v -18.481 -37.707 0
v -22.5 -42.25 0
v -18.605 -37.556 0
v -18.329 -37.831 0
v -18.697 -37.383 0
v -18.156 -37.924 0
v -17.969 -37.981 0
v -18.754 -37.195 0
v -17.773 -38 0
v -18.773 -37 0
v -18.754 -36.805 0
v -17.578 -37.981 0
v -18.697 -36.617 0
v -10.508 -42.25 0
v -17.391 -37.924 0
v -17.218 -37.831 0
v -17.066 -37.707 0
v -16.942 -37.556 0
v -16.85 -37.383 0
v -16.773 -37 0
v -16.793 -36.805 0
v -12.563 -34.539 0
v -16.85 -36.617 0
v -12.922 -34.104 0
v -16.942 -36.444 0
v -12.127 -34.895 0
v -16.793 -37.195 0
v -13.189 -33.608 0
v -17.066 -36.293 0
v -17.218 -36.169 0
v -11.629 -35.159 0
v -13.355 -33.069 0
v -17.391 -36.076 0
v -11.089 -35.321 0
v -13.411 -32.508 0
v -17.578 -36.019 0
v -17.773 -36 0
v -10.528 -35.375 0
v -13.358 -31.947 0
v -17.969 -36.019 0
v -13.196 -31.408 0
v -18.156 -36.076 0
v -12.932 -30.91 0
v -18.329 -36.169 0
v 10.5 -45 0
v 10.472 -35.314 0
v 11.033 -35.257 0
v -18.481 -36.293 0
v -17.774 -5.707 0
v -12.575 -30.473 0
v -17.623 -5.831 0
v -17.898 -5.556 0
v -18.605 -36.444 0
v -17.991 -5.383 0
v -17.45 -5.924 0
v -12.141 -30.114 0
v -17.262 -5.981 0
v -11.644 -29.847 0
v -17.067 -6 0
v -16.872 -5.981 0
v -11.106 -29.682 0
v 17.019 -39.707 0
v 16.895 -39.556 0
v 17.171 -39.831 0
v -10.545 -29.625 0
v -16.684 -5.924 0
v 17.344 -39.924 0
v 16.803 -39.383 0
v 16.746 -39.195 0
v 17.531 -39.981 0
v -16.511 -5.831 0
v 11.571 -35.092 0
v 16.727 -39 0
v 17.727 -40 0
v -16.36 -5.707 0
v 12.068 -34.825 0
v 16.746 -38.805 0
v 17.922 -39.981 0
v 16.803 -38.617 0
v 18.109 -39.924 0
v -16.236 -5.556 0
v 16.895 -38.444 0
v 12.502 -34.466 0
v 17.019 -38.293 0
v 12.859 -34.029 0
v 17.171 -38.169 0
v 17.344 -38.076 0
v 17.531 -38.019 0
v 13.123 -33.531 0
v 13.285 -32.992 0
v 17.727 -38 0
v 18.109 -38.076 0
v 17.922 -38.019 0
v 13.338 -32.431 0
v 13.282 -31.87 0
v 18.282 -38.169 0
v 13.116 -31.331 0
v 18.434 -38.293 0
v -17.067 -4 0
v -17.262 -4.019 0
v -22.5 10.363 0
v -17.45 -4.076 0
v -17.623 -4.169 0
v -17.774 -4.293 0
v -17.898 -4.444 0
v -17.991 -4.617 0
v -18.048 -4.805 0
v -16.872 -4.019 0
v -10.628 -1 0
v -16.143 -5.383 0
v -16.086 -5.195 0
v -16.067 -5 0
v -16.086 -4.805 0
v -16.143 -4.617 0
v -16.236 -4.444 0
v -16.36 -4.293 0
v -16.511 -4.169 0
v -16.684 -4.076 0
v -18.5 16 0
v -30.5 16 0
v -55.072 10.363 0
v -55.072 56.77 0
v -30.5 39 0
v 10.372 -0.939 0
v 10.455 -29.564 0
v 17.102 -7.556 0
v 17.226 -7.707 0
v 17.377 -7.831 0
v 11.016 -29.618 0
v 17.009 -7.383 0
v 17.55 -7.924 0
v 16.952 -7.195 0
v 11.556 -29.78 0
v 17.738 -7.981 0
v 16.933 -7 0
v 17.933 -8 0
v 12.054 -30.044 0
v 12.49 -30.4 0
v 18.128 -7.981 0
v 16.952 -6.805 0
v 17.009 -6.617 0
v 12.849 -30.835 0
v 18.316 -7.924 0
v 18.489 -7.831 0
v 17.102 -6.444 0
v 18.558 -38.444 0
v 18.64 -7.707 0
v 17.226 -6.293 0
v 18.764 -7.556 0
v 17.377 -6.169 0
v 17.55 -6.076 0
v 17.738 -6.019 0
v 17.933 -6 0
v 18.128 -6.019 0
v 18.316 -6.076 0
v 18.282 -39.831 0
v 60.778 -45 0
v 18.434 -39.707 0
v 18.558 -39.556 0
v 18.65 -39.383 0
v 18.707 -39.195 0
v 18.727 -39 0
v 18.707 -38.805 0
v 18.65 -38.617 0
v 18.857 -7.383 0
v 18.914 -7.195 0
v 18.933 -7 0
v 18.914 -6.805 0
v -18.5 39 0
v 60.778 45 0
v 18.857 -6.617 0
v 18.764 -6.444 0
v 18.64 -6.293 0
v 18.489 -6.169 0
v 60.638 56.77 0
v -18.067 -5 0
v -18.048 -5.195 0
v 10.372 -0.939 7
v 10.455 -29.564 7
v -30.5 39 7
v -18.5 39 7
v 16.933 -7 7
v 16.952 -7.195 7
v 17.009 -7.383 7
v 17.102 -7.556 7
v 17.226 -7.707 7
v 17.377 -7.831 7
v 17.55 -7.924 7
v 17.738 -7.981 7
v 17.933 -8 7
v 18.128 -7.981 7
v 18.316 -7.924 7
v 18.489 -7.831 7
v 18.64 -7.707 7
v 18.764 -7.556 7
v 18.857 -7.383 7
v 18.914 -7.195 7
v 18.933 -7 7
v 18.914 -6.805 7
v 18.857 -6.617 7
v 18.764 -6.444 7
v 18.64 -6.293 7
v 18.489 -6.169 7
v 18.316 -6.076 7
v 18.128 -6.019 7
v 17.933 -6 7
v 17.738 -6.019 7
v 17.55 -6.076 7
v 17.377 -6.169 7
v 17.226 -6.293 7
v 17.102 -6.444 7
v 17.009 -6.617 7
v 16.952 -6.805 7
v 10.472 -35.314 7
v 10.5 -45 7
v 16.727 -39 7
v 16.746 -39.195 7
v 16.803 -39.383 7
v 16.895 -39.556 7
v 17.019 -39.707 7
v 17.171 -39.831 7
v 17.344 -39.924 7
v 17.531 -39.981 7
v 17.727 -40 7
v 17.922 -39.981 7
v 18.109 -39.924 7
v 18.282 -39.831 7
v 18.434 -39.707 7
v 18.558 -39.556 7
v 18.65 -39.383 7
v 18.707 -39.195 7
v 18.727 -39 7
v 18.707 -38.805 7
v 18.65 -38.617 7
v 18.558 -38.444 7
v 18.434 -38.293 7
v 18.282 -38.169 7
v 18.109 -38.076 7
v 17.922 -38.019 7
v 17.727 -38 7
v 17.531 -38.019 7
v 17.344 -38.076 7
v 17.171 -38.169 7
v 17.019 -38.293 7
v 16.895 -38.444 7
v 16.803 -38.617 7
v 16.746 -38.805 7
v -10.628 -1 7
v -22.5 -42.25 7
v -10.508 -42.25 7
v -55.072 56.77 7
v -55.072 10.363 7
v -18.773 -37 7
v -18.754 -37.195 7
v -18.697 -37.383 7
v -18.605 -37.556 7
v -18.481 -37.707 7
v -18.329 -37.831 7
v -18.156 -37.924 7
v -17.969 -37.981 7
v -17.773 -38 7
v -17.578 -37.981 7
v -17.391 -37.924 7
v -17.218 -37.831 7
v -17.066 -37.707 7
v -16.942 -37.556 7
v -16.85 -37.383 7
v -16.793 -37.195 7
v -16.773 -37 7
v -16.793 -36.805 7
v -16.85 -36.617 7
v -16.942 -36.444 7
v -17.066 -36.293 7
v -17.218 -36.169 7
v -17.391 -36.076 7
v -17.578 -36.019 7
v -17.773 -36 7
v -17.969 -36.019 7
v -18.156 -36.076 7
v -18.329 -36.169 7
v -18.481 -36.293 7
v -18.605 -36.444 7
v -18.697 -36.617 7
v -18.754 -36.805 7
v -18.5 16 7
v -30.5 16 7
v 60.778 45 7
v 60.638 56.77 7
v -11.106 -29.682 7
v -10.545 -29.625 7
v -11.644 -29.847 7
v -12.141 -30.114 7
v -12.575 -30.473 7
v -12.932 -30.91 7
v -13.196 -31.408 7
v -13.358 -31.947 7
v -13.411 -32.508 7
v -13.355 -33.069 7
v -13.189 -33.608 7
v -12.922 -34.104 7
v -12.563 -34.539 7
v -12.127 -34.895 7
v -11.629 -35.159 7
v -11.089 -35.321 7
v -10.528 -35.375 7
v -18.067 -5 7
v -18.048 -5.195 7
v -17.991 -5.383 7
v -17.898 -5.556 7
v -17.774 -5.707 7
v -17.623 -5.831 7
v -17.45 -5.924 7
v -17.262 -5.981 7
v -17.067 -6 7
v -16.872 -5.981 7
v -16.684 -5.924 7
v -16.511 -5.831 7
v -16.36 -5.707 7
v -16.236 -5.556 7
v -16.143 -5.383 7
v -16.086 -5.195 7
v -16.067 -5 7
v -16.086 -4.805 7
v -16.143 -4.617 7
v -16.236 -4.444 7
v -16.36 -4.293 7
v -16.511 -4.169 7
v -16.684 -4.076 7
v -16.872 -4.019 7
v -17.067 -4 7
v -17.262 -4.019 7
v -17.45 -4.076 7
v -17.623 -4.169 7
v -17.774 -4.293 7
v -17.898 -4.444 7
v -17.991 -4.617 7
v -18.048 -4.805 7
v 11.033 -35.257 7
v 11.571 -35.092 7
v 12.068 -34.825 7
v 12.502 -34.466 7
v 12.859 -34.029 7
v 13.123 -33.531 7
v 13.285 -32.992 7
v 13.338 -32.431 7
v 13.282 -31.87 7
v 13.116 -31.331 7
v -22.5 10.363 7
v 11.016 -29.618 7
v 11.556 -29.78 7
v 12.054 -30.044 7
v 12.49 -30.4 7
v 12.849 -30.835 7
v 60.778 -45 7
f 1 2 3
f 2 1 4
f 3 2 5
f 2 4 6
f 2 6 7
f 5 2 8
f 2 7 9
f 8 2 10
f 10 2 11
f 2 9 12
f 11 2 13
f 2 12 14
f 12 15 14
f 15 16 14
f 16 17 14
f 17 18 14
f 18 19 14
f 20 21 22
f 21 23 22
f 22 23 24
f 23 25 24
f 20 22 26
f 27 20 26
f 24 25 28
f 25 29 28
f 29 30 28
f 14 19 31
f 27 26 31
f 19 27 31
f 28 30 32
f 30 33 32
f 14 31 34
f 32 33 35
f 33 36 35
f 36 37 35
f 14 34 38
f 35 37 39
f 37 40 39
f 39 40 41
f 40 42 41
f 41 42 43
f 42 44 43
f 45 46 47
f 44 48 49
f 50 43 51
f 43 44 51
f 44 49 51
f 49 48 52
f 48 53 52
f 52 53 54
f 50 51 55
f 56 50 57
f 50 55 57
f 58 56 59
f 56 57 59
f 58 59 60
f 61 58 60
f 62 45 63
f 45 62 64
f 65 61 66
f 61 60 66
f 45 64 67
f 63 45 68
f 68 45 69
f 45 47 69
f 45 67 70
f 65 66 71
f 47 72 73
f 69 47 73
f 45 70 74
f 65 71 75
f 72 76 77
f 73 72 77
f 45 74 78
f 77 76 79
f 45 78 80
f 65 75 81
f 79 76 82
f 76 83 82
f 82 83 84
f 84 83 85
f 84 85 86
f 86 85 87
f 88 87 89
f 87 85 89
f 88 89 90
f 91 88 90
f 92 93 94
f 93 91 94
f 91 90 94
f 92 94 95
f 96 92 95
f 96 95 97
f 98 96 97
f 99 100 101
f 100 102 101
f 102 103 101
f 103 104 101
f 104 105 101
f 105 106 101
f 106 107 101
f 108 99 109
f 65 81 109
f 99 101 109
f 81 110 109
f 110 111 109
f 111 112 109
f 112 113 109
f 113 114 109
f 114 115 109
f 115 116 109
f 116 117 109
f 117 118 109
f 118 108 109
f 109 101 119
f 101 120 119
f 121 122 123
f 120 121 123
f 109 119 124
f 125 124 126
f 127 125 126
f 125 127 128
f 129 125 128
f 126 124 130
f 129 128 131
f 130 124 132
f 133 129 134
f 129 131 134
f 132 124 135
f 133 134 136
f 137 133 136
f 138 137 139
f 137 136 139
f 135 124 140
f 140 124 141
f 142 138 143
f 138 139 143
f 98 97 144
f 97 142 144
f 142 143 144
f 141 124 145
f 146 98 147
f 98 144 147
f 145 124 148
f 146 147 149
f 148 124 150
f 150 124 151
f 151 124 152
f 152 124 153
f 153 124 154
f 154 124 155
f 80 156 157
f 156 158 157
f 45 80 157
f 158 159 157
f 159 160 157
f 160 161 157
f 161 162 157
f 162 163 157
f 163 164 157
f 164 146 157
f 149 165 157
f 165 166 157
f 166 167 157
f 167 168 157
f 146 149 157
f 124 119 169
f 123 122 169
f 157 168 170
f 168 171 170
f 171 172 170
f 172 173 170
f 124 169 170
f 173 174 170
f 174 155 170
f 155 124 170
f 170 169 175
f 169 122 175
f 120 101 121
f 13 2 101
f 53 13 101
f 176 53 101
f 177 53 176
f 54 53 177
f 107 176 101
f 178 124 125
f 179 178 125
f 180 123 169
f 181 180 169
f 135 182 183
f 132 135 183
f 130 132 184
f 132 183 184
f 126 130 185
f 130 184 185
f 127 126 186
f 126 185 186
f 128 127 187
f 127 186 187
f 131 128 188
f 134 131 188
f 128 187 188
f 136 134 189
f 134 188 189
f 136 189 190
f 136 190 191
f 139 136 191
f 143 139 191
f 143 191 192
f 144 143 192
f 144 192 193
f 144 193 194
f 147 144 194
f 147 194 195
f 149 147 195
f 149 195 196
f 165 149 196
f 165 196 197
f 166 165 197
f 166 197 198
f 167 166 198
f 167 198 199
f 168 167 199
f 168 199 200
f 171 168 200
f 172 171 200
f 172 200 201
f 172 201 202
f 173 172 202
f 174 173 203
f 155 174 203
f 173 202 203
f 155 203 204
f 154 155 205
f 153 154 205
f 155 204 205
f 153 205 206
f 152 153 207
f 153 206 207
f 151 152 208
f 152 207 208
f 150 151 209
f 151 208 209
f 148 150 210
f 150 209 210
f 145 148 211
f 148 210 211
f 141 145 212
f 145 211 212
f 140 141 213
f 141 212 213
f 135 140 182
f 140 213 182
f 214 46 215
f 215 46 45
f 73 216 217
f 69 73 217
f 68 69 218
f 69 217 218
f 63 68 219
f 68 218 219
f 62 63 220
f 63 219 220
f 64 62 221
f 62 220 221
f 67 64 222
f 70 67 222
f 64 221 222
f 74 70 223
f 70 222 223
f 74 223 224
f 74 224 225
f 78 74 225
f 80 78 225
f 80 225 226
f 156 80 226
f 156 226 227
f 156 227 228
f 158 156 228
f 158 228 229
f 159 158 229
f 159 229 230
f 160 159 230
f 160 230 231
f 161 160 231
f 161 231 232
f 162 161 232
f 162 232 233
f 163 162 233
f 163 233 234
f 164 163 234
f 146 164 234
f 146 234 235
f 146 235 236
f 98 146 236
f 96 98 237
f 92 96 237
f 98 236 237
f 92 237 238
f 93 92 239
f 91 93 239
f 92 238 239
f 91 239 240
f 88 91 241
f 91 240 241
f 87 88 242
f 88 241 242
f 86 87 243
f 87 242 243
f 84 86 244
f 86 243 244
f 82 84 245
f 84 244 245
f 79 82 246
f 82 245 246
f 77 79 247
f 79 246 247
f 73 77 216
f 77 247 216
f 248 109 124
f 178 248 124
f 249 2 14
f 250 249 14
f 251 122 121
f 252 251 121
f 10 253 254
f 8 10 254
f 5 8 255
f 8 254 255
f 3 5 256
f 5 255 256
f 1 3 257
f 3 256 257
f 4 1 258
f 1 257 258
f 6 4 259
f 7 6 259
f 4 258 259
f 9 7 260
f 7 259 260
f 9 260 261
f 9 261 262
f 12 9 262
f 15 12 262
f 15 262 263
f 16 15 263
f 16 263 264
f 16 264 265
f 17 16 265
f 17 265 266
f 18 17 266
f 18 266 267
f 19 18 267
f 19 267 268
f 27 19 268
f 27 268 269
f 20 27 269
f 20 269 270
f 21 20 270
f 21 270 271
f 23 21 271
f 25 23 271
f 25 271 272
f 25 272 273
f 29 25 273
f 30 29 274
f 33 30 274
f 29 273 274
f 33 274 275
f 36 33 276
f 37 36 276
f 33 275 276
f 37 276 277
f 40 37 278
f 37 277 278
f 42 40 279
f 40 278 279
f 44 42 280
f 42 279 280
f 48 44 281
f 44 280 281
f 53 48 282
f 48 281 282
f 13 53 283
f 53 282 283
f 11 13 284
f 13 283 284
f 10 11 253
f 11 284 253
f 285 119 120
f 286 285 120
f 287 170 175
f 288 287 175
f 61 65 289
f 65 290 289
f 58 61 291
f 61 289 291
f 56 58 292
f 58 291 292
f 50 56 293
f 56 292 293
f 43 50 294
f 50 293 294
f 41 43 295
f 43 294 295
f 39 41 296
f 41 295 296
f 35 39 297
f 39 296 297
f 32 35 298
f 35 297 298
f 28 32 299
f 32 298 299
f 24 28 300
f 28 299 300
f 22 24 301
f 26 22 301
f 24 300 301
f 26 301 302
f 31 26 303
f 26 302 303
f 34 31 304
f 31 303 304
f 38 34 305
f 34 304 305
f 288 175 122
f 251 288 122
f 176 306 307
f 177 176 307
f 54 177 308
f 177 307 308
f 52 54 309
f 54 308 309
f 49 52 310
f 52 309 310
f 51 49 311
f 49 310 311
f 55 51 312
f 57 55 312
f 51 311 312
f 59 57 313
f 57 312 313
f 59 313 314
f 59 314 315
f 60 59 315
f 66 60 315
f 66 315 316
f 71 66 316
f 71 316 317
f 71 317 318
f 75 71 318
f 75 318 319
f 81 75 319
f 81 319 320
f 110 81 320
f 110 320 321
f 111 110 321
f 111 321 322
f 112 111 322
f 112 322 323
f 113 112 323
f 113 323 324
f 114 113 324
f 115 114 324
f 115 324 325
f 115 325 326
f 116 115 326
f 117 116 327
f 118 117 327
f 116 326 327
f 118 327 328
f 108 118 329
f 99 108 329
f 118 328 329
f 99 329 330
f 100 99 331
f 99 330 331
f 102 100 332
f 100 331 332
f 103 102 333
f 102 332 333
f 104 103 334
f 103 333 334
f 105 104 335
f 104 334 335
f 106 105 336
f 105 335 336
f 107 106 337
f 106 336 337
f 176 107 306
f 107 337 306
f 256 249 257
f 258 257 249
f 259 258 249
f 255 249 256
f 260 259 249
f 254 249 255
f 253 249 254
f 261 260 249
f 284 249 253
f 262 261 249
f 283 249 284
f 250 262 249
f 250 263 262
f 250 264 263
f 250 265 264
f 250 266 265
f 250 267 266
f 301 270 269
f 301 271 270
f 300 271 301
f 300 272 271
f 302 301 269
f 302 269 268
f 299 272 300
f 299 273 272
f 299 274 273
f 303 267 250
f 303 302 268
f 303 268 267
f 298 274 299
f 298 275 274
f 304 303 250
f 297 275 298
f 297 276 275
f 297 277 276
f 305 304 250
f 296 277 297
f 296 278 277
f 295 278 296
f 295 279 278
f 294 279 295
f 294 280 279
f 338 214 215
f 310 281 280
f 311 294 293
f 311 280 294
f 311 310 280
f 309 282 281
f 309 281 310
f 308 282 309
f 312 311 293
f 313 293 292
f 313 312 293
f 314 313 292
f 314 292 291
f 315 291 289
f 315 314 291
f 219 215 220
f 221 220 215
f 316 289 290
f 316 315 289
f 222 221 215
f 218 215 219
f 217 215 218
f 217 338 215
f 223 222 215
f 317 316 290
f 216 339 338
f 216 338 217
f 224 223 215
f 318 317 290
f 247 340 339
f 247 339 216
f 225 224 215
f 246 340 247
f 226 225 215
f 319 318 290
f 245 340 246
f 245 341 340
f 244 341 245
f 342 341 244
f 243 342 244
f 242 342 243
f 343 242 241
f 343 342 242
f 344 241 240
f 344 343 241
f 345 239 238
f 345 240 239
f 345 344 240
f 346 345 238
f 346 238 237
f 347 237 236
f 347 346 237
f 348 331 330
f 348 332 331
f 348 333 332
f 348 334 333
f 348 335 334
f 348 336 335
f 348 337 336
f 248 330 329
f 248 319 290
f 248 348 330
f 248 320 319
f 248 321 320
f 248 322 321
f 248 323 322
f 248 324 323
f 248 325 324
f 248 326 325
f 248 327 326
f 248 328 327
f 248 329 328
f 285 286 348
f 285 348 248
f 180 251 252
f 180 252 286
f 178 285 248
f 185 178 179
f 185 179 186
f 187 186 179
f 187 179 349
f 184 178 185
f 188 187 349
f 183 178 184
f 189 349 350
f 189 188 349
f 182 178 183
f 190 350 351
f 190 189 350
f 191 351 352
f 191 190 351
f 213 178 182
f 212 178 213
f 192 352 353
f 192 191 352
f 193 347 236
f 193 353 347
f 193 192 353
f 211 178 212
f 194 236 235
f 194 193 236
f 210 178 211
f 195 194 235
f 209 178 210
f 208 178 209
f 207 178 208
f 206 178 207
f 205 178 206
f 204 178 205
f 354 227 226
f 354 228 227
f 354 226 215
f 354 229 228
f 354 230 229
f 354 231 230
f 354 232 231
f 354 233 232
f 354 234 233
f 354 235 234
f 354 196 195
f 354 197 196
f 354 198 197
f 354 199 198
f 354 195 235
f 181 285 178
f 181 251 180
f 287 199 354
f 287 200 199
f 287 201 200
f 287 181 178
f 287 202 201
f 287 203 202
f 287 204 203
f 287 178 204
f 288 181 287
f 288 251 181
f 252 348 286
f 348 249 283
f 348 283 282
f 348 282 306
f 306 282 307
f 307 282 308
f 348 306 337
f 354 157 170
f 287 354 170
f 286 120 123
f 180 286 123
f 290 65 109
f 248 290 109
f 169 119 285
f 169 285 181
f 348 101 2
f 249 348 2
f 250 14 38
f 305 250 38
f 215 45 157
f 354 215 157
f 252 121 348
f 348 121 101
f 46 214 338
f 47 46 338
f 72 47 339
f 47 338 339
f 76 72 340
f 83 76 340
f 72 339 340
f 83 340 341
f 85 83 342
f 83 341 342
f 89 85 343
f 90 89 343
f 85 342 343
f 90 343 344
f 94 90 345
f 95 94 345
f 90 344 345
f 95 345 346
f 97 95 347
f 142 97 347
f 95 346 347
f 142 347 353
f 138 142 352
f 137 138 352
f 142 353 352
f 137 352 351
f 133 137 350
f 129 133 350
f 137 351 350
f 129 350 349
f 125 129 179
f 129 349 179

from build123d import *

# Parameters (mm, degrees)
F0_W     = 8
F0_H     = 6
F0_H_2   = 5.6374937892
F0_W_2   = 4
F0_H_3   = 23
F0_W_3   = 38.2781559229
F0_H_4   = 34.3460934982
F1_DEPTH = 7
F2_D     = 2
F3_D     = 5.75


with BuildPart() as f1:
    # F0 (on Top) → F1 (new body)
    with BuildSketch(Plane.XY):
        Polygon((10.5, -45), (22.5, -45), (22.5, -10.6539065018), (22.5, 17.153987661), (0, 45), (-14.5, 45), (-14.5, 39), (-14.5, 16), (-14.5, 10.3625062108), (-22.5, 10.3625062108), (-22.5, -42.25), (-10.5080957781, -42.25), (-10.6281967604, -1.0001864958), (10.3717142302, -0.9390441602), align=None)
        Polygon((0, 45), (22.5, 17.153987661), (22.5, 45), align=None)
        Polygon((-30.5, 39), (-30.5, 45), (-55.0723059862, 45), (-55.0723059862, 10.3625062108), (-30.5, 10.3625062108), (-30.5, 16), align=None)
        with Locations((-26.5, 42)):
            Rectangle(F0_W, F0_H)
        Polygon((-14.5, 39), (-14.5, 45), (-22.5, 45), (-22.5, 39), (-18.5, 39), align=None)
        Polygon((-22.5, 16), (-22.5, 10.3625062108), (-14.5, 10.3625062108), (-14.5, 16), (-18.5, 16), align=None)
        with Locations((-26.5, 13.1812531054)):
            Rectangle(F0_W, F0_H_2)
        Polygon((22.5, 17.153987661), (22.5, -10.6539065018), (60.7781559229, -10.6539065018), (60.7781559229, 45), (22.5, 45), align=None)
        Polygon((0, 45), (22.5, 45), (60.7781559229, 45), (60.6384575367, 56.7700602114), (-55.0723059862, 56.7700602114), (-55.0723059862, 45), (-30.5, 45), (-22.5, 45), (-14.5, 45), align=None)
        with Locations((-16.5, 27.5)):
            Rectangle(F0_W_2, F0_H_3)
        with Locations((41.6390779614, -27.8269532509)):
            Rectangle(F0_W_3, F0_H_4)
    extrude(amount=F1_DEPTH)

    # F2 (through all)
    with Locations(Plane(origin=(0, 0, 0), x_dir=(1, 0, 0), z_dir=(0, 0, -1))):
        with Locations((-17.0669870824, 5), (-17.7734121563, 37), (17.7265878437, 39), (17.9330129176, 7)):
            Hole(F2_D / 2)

    # F3 (through all)
    with Locations(Plane(origin=(0, 0, 0), x_dir=(1, 0, 0), z_dir=(0, 0, -1))):
        with Locations((-10.5364832571, 32.5000529818), (10.4634277335, 32.4389106462)):
            Hole(F3_D / 2)


solid = f1.part
